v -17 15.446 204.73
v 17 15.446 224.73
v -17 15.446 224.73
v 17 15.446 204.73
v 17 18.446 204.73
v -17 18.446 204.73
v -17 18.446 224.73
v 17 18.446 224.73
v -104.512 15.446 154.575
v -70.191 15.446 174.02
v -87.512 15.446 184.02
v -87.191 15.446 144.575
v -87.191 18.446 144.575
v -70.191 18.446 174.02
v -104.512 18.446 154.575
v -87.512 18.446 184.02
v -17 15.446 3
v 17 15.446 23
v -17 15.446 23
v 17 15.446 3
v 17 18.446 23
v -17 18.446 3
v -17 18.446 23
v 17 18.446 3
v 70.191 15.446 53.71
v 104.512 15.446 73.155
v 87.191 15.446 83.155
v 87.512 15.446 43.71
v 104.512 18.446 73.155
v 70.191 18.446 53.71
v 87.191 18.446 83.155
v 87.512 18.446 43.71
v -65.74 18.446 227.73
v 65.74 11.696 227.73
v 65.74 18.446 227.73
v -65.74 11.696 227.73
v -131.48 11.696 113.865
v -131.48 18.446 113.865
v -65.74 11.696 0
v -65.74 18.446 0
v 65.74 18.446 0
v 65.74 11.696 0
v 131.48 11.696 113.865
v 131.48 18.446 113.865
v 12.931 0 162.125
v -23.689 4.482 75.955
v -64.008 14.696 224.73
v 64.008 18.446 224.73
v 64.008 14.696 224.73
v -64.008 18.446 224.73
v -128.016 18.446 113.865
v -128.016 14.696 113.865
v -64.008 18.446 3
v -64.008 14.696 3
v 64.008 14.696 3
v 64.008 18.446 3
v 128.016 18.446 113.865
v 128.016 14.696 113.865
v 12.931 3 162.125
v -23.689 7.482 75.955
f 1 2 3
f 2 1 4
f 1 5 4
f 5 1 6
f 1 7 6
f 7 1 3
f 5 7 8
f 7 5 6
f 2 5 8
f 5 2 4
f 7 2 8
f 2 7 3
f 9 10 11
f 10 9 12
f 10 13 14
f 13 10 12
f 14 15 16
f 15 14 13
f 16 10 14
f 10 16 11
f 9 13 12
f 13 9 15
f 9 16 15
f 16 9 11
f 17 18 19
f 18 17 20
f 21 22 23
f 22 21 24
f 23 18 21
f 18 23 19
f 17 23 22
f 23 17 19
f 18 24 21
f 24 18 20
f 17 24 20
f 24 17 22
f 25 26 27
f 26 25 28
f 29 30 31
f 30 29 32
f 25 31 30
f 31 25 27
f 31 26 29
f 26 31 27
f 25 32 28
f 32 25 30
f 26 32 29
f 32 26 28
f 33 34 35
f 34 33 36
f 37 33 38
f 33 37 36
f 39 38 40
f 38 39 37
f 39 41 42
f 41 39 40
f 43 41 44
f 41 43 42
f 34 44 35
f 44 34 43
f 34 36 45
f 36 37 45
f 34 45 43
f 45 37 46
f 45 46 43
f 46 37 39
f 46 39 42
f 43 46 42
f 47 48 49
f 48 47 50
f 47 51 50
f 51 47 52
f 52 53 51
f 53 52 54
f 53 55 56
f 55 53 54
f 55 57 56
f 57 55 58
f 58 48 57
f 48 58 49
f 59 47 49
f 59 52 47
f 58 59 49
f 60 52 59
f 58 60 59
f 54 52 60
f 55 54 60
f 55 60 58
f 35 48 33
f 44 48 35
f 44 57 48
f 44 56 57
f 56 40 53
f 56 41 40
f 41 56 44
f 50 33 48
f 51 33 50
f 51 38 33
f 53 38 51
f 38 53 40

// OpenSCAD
/*
    parametric_faceted_hex_wall_tile_mount_v24_10x10_vertical_flat_side.scad
    ----------------------------------------------------------------
    Regular asymmetric low-poly hex wall tile.

    v24 goals
    ---------
    1. Exact 10.00" x 10.00" finished face bounding box by default.
    2. Preserve a TRUE regular hexagon -- no X/Y stretching.
    3. Vertical-print-first export option:
       - model can export standing on one edge
       - finished wall geometry is unchanged
    4. Vertical export rests on a complete flat hex side, not a point.
    5. Open back remains fully open.
    6. Hidden mounting pads remain clipped below the visible face.
    7. One master thickness controls shell, perimeter, and pads.
    8. Optional breakaway vertical-print feet are available but OFF by default.

    Recommended default
    -------------------
    face_size_reference      = "bounding_square";
    face_size_units          = "mm";
    face_size                = 254.0;   // exact 10" x 10" envelope
    tile_rotation_deg        = 15;      // makes regular-hex X/Y envelope equal

    export_orientation       = "vertical";
    vertical_edge_angle_deg  = 15;   // flat side on build plate

    master_thickness_mm      = 3.0;
    add_mount_pads           = true;
    add_mount_ribs           = false;

    Export
    ------
    F6 Render
    File -> Export -> Export as STL
*/


// =============================================================================
// CUSTOMIZER PARAMETERS
// =============================================================================


/* [Finished Face Size] */

// "bounding_square"
//     face_size is the maximum X and Y envelope.
//     At the default 15-degree rotation, a regular hex fills the square exactly.
//
// "flat_to_flat"
//     face_size is the traditional hex flat-to-flat dimension.
//
// "across_corners"
//     face_size is the regular-hex corner-to-corner dimension.
face_size_reference = "bounding_square"; // [bounding_square, flat_to_flat, across_corners]

// Units used by face_size.
face_size_units = "mm";                   // [mm, in]

// Default = exact 10.00 inches.
face_size = 254.0;

// Rotation of the finished hex within its face plane.
//
// IMPORTANT:
// 15 degrees gives a regular hex an equal X/Y bounding envelope.
// With bounding_square + 254 mm this produces approximately:
//     X = 254.0 mm
//     Y = 254.0 mm
tile_rotation_deg = 15;


/* [Export / Print Orientation] */

// "flat"     = conventional CAD orientation; decorative face points +Z.
// "vertical" = rotate final part onto an edge for vertical printing.
export_orientation = "vertical";          // [flat, vertical]

// Additional in-plane rotation used ONLY before standing the part vertically.
//
// IMPORTANT:
// The finished face uses tile_rotation_deg = 15 so its X/Y envelope is exactly
// square. A regular hex rests on a FLAT SIDE when its effective print-plane
// rotation is 30 degrees (modulo 60 degrees).
//
// Therefore the default vertical export adds another 15 degrees:
//
//     15 deg finished-face rotation
//   + 15 deg vertical export rotation
//   = 30 deg effective print rotation
//
// This puts a complete flat hex side on the build plate instead of a point.
// The transformed model is automatically translated so that side rests at Z=0.
// Rotate the finished 15-degree face orientation another 15 degrees before
// standing it up. 15 + 15 = 30 degrees, which places a complete hex side
// horizontally at the bottom rather than balancing the tile on a vertex.
vertical_edge_angle_deg = 15;

// Add small breakaway stabilizer feet after the model is stood vertically.
// Normally leave OFF and use a slicer brim if required.
add_vertical_breakaway_feet = false;

// Breakaway-foot dimensions.
vertical_foot_length_mm = 20.0;
vertical_foot_depth_mm = 8.0;
vertical_foot_height_mm = 0.60;
vertical_foot_neck_mm = 0.80;


/* [MASTER THICKNESS] */

// Main material thickness control.
master_thickness_mm = 3.0;

// Optional tuning multipliers.
front_shell_multiplier = 1.0;
perimeter_multiplier   = 1.0;
mount_pad_multiplier   = 1.0;


/* [Front Relief] */

// "proportional" scales relief with the true flat-to-flat dimension.
// "absolute" uses explicit millimeter values.
relief_height_mode = "proportional";      // [proportional, absolute]

relief_scale = 1.0;

// Relative relief proportions.
peak_height_ratio = 0.081;
ridge_to_peak_ratio = 0.757;
edge_to_peak_ratio = 0.097;

// Used only in absolute mode.
peak_height_mm   = 18.5;
ridge_height_mm = 14.0;
edge_height_mm  = 1.8;

// Minimum air gap between inner roof and mounting geometry.
edge_clearance_mm = 0.60;


/* [Facet Layout] */

peak_angle_deg = 45;
peak_radius_ratio = 0.38;

ridge_angle_deg = 208;
ridge_radius_ratio = 0.34;


/* [Wall Mounting] */

add_mount_pads = true;

// Width parallel to local hex edge.
mount_pad_width_mm = 34.0;

// Radial depth into the cavity.
mount_pad_depth_mm = 24.0;

// Structural overlap beneath the inner perimeter shell.
mount_pad_overlap_mm = 4.0;

// Pull mounting geometry inward from the visible outside perimeter.
mount_pad_edge_inset_mm = 3.0;

// Clearance below underside of visible face.
mount_face_clearance_mm = 0.75;

// Mount-pad directions in the tile's local coordinate system.
mount_pad_angles = [60, 120, 240, 300];


/* [Mount Reinforcement] */

add_mount_ribs = false;

mount_rib_width_mm  = 3.0;
mount_rib_height_mm = 5.0;
mount_rib_depth_mm  = 8.0;


/* [Optional Screw Holes] */

add_pad_screw_holes = false;

pad_screw_hole_diameter_mm = 4.5;


/* [Advanced] */

polyhedron_convexity = 12;
screw_hole_fn = 40;

// Small numerical tolerance.
eps = 0.01;


// =============================================================================
// HELPERS
// =============================================================================

function polar(angle_deg, radius) =
    [
        radius * cos(angle_deg),
        radius * sin(angle_deg)
    ];

function hex_vertex_unrotated(i, radius) =
    [
        radius * cos(30 + i * 60),
        radius * sin(30 + i * 60)
    ];

function rotate2d(p, angle_deg) =
    [
        p[0] * cos(angle_deg) - p[1] * sin(angle_deg),
        p[0] * sin(angle_deg) + p[1] * cos(angle_deg)
    ];

function hex_vertex(i, radius) =
    rotate2d(
        hex_vertex_unrotated(i, radius),
        tile_rotation_deg
    );

// Half-width / half-height of a unit-circumradius rotated regular hex.
function unit_hex_half_x(rotation_deg) =
    max([
        for (i = [0 : 5])
            abs(
                cos(30 + i * 60 + rotation_deg)
            )
    ]);

function unit_hex_half_y(rotation_deg) =
    max([
        for (i = [0 : 5])
            abs(
                sin(30 + i * 60 + rotation_deg)
            )
    ]);

// Bounding box of a regular hex with circumradius r.
function hex_bbox_x(r, rotation_deg) =
    2 * r * unit_hex_half_x(rotation_deg);

function hex_bbox_y(r, rotation_deg) =
    2 * r * unit_hex_half_y(rotation_deg);


// =============================================================================
// DERIVED MATERIAL THICKNESSES
// =============================================================================

front_shell_thickness_mm =
    master_thickness_mm * front_shell_multiplier;

perimeter_wall_thickness_mm =
    master_thickness_mm * perimeter_multiplier;

mount_pad_thickness_mm =
    master_thickness_mm * mount_pad_multiplier;


// =============================================================================
// DERIVED FACE DIMENSIONS
// =============================================================================

_face_size_mm =
    face_size_units == "in"
        ? face_size * 25.4
        : face_size;

// If bounding_square is selected, choose the largest regular-hex radius that
// fits inside both the requested X and Y dimensions.
//
// At tile_rotation_deg = 15, unit X and Y extents are equal, so both dimensions
// become exactly face_size.
r_outer =
    face_size_reference == "flat_to_flat"
        ? (_face_size_mm / 2) / cos(30)
        : face_size_reference == "across_corners"
            ? _face_size_mm / 2
            : min(
                _face_size_mm / (2 * unit_hex_half_x(tile_rotation_deg)),
                _face_size_mm / (2 * unit_hex_half_y(tile_rotation_deg))
              );

tile_flat_to_flat =
    2 * r_outer * cos(30);

tile_across_corners =
    2 * r_outer;

finished_bbox_x =
    hex_bbox_x(r_outer, tile_rotation_deg);

finished_bbox_y =
    hex_bbox_y(r_outer, tile_rotation_deg);

outer_apothem =
    tile_flat_to_flat / 2;

inner_apothem =
    outer_apothem - perimeter_wall_thickness_mm;

r_inner =
    inner_apothem / cos(30);

inner_flat_length =
    2 * inner_apothem * tan(30);

hex_side_length =
    r_outer;


// =============================================================================
// DERIVED RELIEF HEIGHTS
// =============================================================================

_peak_unscaled =
    relief_height_mode == "proportional"
        ? tile_flat_to_flat * peak_height_ratio
        : peak_height_mm;

_ridge_unscaled =
    relief_height_mode == "proportional"
        ? _peak_unscaled * ridge_to_peak_ratio
        : ridge_height_mm;

_requested_edge_unscaled =
    relief_height_mode == "proportional"
        ? _peak_unscaled * edge_to_peak_ratio
        : edge_height_mm;

peak_height =
    _peak_unscaled * relief_scale;

ridge_height =
    _ridge_unscaled * relief_scale;

requested_edge_height =
    _requested_edge_unscaled * relief_scale;

// Enough vertical room for front shell + complete pad + clearance.
minimum_edge_height =
    front_shell_thickness_mm
    + mount_pad_thickness_mm
    + mount_face_clearance_mm;

edge_height =
    max(
        requested_edge_height,
        minimum_edge_height
    );


// =============================================================================
// DERIVED MOUNTING GEOMETRY
// =============================================================================

mount_pad_desired_outer_r =
    inner_apothem + mount_pad_overlap_mm;

mount_pad_inner_r =
    mount_pad_desired_outer_r - mount_pad_depth_mm;

mount_pad_center_r =
    mount_pad_desired_outer_r - mount_pad_depth_mm / 2;

mount_clip_apothem =
    outer_apothem - mount_pad_edge_inset_mm;

mount_clip_radius =
    mount_clip_apothem / cos(30);


// =============================================================================
// VERTICAL-EXPORT DERIVED VALUES
// =============================================================================
//
// The tile is first rotated around Z by vertical_edge_angle_deg, then stood up
// by +90 degrees around X.
//
// We calculate the local Y envelope AFTER that optional Z rotation so the
// final model can be translated to put its lowest point exactly on Z=0.

vertical_rotation_total_deg =
    vertical_edge_angle_deg;

vertical_half_y =
    max([
        for (i = [0 : 5])
            abs(
                r_outer
                * sin(
                    30
                    + i * 60
                    + tile_rotation_deg
                    + vertical_rotation_total_deg
                )
            )
    ]);

vertical_print_height =
    2 * vertical_half_y;

// After rotate([90,0,0]), original +Z becomes -Y.
// Translate by peak_height so all relief lies in positive Y.
vertical_print_depth =
    peak_height;


// =============================================================================
// VALIDATION
// =============================================================================

assert(
    _face_size_mm > 0,
    "face_size must produce a positive dimension."
);

assert(
    master_thickness_mm > 0,
    "master_thickness_mm must be greater than zero."
);

assert(
    front_shell_multiplier > 0
    && perimeter_multiplier > 0
    && mount_pad_multiplier > 0,
    "All thickness multipliers must be greater than zero."
);

assert(
    front_shell_thickness_mm > 0,
    "front_shell_thickness_mm must be greater than zero."
);

assert(
    perimeter_wall_thickness_mm > 0,
    "perimeter_wall_thickness_mm must be greater than zero."
);

assert(
    perimeter_wall_thickness_mm < outer_apothem,
    "perimeter_wall_thickness_mm is too large for this tile."
);

assert(
    inner_apothem > 0,
    "The selected perimeter wall leaves no hollow interior."
);

assert(
    edge_height > front_shell_thickness_mm,
    "Internal error: edge_height must exceed front_shell_thickness_mm."
);

assert(
    ridge_height > edge_height,
    "ridge_height must remain greater than the effective edge height."
);

assert(
    peak_height > ridge_height,
    "peak_height must remain greater than ridge_height."
);

assert(
    peak_radius_ratio > 0 && peak_radius_ratio < 0.90,
    "peak_radius_ratio must be between 0 and 0.90."
);

assert(
    ridge_radius_ratio > 0 && ridge_radius_ratio < 0.90,
    "ridge_radius_ratio must be between 0 and 0.90."
);

assert(
    mount_pad_width_mm > 0,
    "mount_pad_width_mm must be greater than zero."
);

assert(
    mount_pad_depth_mm > 0,
    "mount_pad_depth_mm must be greater than zero."
);

assert(
    mount_pad_thickness_mm > 0,
    "mount_pad_thickness_mm must be greater than zero."
);

assert(
    mount_pad_overlap_mm >= 0,
    "mount_pad_overlap_mm cannot be negative."
);

assert(
    mount_pad_edge_inset_mm >= 0,
    "mount_pad_edge_inset_mm cannot be negative."
);

assert(
    mount_face_clearance_mm >= 0,
    "mount_face_clearance_mm cannot be negative."
);

assert(
    mount_clip_apothem > 0,
    "mount_pad_edge_inset_mm is too large."
);

assert(
    mount_pad_inner_r > 0,
    "mount_pad_depth_mm is too large and reaches/passes the tile center."
);

assert(
    !add_pad_screw_holes
    || pad_screw_hole_diameter_mm < mount_pad_width_mm * 0.75,
    "pad_screw_hole_diameter_mm is too large for the mounting pad."
);

assert(
    !add_mount_ribs
    || mount_rib_height_mm > 0,
    "mount_rib_height_mm must be greater than zero."
);

assert(
    !add_vertical_breakaway_feet
    || export_orientation == "vertical",
    "Vertical breakaway feet require export_orientation = \"vertical\"."
);


// =============================================================================
// DIAGNOSTIC OUTPUT
// =============================================================================

echo("====================================================");
echo("FACETED HEX WALL TILE v24 - 10x10 / VERTICAL FLAT-SIDE");
echo("====================================================");

echo(str("face size reference      : ", face_size_reference));
echo(str("requested face size      : ", _face_size_mm, " mm"));
echo(str("tile rotation            : ", tile_rotation_deg, " deg"));

echo(str("finished bbox X          : ", finished_bbox_x, " mm"));
echo(str("finished bbox Y          : ", finished_bbox_y, " mm"));
echo(str("finished bbox X inches   : ", finished_bbox_x / 25.4, " in"));
echo(str("finished bbox Y inches   : ", finished_bbox_y / 25.4, " in"));

echo(str("flat-to-flat             : ", tile_flat_to_flat, " mm"));
echo(str("across-corners           : ", tile_across_corners, " mm"));
echo(str("hex side length          : ", hex_side_length, " mm"));

echo(str("MASTER thickness         : ", master_thickness_mm, " mm"));
echo(str("actual front shell       : ", front_shell_thickness_mm, " mm"));
echo(str("actual perimeter wall    : ", perimeter_wall_thickness_mm, " mm"));
echo(str("actual mount pad         : ", mount_pad_thickness_mm, " mm"));

echo(str("requested edge height    : ", requested_edge_height, " mm"));
echo(str("minimum edge height      : ", minimum_edge_height, " mm"));
echo(str("EFFECTIVE edge height    : ", edge_height, " mm"));

echo(str("ridge height             : ", ridge_height, " mm"));
echo(str("peak height              : ", peak_height, " mm"));
echo(str("peak height inches       : ", peak_height / 25.4, " in"));

echo(str("mount pad width          : ", mount_pad_width_mm, " mm"));
echo(str("mount pad depth          : ", mount_pad_depth_mm, " mm"));
echo(str("mount pad thickness      : ", mount_pad_thickness_mm, " mm"));
echo(str("mount pad overlap        : ", mount_pad_overlap_mm, " mm"));
echo(str("mount edge inset         : ", mount_pad_edge_inset_mm, " mm"));
echo(str("mount/face clearance     : ", mount_face_clearance_mm, " mm"));

echo(str("export orientation       : ", export_orientation));
echo(str("vertical extra rotation  : ", vertical_edge_angle_deg, " deg"));
echo(str("effective print rotation : ",
         tile_rotation_deg + vertical_edge_angle_deg, " deg"));

if (export_orientation == "vertical"
    && abs(
        ((tile_rotation_deg + vertical_edge_angle_deg) % 60) - 30
    ) < 0.001)
    echo("build-plate contact      : FLAT HEX SIDE");
else if (export_orientation == "vertical")
    echo("build-plate contact      : WARNING - NOT EXACTLY FLAT-SIDE DOWN");

if (export_orientation == "vertical") {
    echo(str("vertical print height    : ", vertical_print_height, " mm"));
    echo(str("vertical print depth     : ", vertical_print_depth, " mm"));
}

if (edge_height > requested_edge_height)
    echo(
        str(
            "AUTO EDGE FIX ACTIVE: edge raised from ",
            requested_edge_height,
            " mm to ",
            edge_height,
            " mm."
        )
    );

echo("====================================================");


// =============================================================================
// FRONT RELIEF CONTROL POINTS
// =============================================================================

P_xy =
    polar(
        peak_angle_deg + tile_rotation_deg,
        r_outer * peak_radius_ratio
    );

Q_xy =
    polar(
        ridge_angle_deg + tile_rotation_deg,
        r_outer * ridge_radius_ratio
    );


// =============================================================================
// SHELL VERTICES
// =============================================================================

points =
    concat(

        // 0..5 : outer rear perimeter
        [
            for (i = [0 : 5])
                let(p = hex_vertex(i, r_outer))
                [p[0], p[1], 0]
        ],

        // 6..11 : outer front perimeter
        [
            for (i = [0 : 5])
                let(p = hex_vertex(i, r_outer))
                [p[0], p[1], edge_height]
        ],

        // 12..13 : outer peak / ridge
        [
            [P_xy[0], P_xy[1], peak_height],
            [Q_xy[0], Q_xy[1], ridge_height]
        ],

        // 14..19 : inner rear perimeter
        [
            for (i = [0 : 5])
                let(p = hex_vertex(i, r_inner))
                [p[0], p[1], 0]
        ],

        // 20..25 : inner front perimeter
        [
            for (i = [0 : 5])
                let(p = hex_vertex(i, r_inner))
                [p[0], p[1], edge_height - front_shell_thickness_mm]
        ],

        // 26..27 : inner peak / ridge
        [
            [
                P_xy[0],
                P_xy[1],
                peak_height - front_shell_thickness_mm
            ],
            [
                Q_xy[0],
                Q_xy[1],
                ridge_height - front_shell_thickness_mm
            ]
        ]
    );


// =============================================================================
// SHELL FACES
// =============================================================================

outer_roof_faces = [
    [6, 7, 12],
    [7, 8, 12],
    [6, 12, 11],

    [8, 13, 12],
    [11, 12, 13],

    [8, 9, 13],
    [9, 10, 13],
    [10, 11, 13]
];

inner_roof_faces = [
    [26, 21, 20],
    [26, 22, 21],
    [25, 26, 20],

    [26, 27, 22],
    [27, 26, 25],

    [27, 23, 22],
    [27, 24, 23],
    [27, 25, 24]
];

faces =
    concat(

        // Outer vertical perimeter
        [
            for (i = [0 : 5])
                [
                    i,
                    (i + 1) % 6,
                    6 + (i + 1) % 6,
                    6 + i
                ]
        ],

        outer_roof_faces,

        // Inner vertical perimeter
        [
            for (i = [0 : 5])
                [
                    14 + i,
                    20 + i,
                    20 + (i + 1) % 6,
                    14 + (i + 1) % 6
                ]
        ],

        inner_roof_faces,

        // Narrow rear perimeter ring only.
        // Center remains fully open.
        [
            for (i = [0 : 5])
                [
                    i,
                    14 + i,
                    14 + (i + 1) % 6,
                    (i + 1) % 6
                ]
        ]
    );


// =============================================================================
// TILE SHELL
// =============================================================================

module tile_shell() {
    polyhedron(
        points = points,
        faces = faces,
        convexity = polyhedron_convexity
    );
}


// =============================================================================
// SAFE MOUNTING VOLUME BELOW FRONT FACE
// =============================================================================

safe_edge_z =
    max(
        eps,
        edge_height
        - front_shell_thickness_mm
        - mount_face_clearance_mm
    );

safe_peak_z =
    max(
        eps,
        peak_height
        - front_shell_thickness_mm
        - mount_face_clearance_mm
    );

safe_ridge_z =
    max(
        eps,
        ridge_height
        - front_shell_thickness_mm
        - mount_face_clearance_mm
    );

safe_mount_points =
    concat(

        // 0..5 : rear outer perimeter
        [
            for (i = [0 : 5])
                let(p = hex_vertex(i, r_outer))
                [p[0], p[1], 0]
        ],

        // 6..11 : safe ceiling at outer perimeter
        [
            for (i = [0 : 5])
                let(p = hex_vertex(i, r_outer))
                [p[0], p[1], safe_edge_z]
        ],

        // 12..13 : safe ceiling under peak/ridge
        [
            [P_xy[0], P_xy[1], safe_peak_z],
            [Q_xy[0], Q_xy[1], safe_ridge_z]
        ]
    );

safe_mount_ceiling_faces = [
    [6, 7, 12],
    [7, 8, 12],
    [6, 12, 11],
    [8, 13, 12],
    [11, 12, 13],
    [8, 9, 13],
    [9, 10, 13],
    [10, 11, 13]
];

safe_mount_faces =
    concat(

        // Outer side walls.
        [
            for (i = [0 : 5])
                [
                    i,
                    (i + 1) % 6,
                    6 + (i + 1) % 6,
                    6 + i
                ]
        ],

        // Sloped safe ceiling.
        safe_mount_ceiling_faces,

        // Rear floor used only to close clipping volume.
        [[5, 4, 3, 2, 1, 0]]
    );

module safe_mount_volume() {
    polyhedron(
        points = safe_mount_points,
        faces = safe_mount_faces,
        convexity = polyhedron_convexity
    );
}


// =============================================================================
// HEX FOOTPRINT FOR MOUNT CLIPPING
// =============================================================================

module mount_clip_volume(height_mm) {
    linear_extrude(height = height_mm)
        polygon(
            points = [
                for (i = [0 : 5])
                    hex_vertex(i, mount_clip_radius)
            ]
        );
}


// =============================================================================
// RAW MOUNT PAD
// =============================================================================
//
// Mount-pad angles are local tile angles. tile_rotation_deg is applied so the
// pads remain attached to the same visual positions when the face rotates.

module raw_mount_pad(angle_deg) {
    rotate([0, 0, angle_deg + tile_rotation_deg])
        translate(
            [
                mount_pad_inner_r,
                -mount_pad_width_mm / 2,
                0
            ]
        )
            cube(
                [
                    mount_pad_depth_mm,
                    mount_pad_width_mm,
                    mount_pad_thickness_mm
                ]
            );
}


// =============================================================================
// CLIPPED MOUNT PAD
// =============================================================================

module mount_pad(angle_deg) {
    intersection() {

        raw_mount_pad(angle_deg);

        // Keep pad inside inset hex footprint.
        mount_clip_volume(
            mount_pad_thickness_mm + eps
        );

        // Hard stop below underside of front shell.
        safe_mount_volume();
    }
}


// =============================================================================
// OPTIONAL REINFORCING RIBS
// =============================================================================

module raw_mount_ribs(angle_deg) {

    rib_center_r =
        mount_pad_desired_outer_r
        - mount_rib_depth_mm / 2;

    rib_side_offset =
        max(
            0,
            mount_pad_width_mm / 2
            - mount_rib_width_mm
            - 2
        );

    rotate([0, 0, angle_deg + tile_rotation_deg]) {

        for (side = [-1, 1]) {

            translate(
                [
                    rib_center_r - mount_rib_depth_mm / 2,
                    side * rib_side_offset - mount_rib_width_mm / 2,
                    mount_pad_thickness_mm
                ]
            )

            rotate([90, 0, 90])

            linear_extrude(height = mount_rib_depth_mm)

            polygon(
                points = [
                    [0, 0],
                    [mount_rib_width_mm, 0],
                    [mount_rib_width_mm, mount_rib_height_mm],
                    [0, 0]
                ]
            );
        }
    }
}

module mount_ribs(angle_deg) {
    intersection() {

        raw_mount_ribs(angle_deg);

        mount_clip_volume(
            mount_pad_thickness_mm
            + mount_rib_height_mm
            + 0.1
        );

        safe_mount_volume();
    }
}


// =============================================================================
// OPTIONAL SCREW HOLE
// =============================================================================

module pad_screw_hole(angle_deg) {

    rotate([0, 0, angle_deg + tile_rotation_deg])

        translate(
            [
                mount_pad_center_r,
                0,
                -1
            ]
        )

            cylinder(
                d = pad_screw_hole_diameter_mm,
                h =
                    mount_pad_thickness_mm
                    + mount_rib_height_mm
                    + 2,
                $fn = screw_hole_fn
            );
}


// =============================================================================
// COMPLETE FINISHED TILE
// =============================================================================

module finished_tile() {

    difference() {

        union() {

            tile_shell();

            if (add_mount_pads) {

                for (a = mount_pad_angles) {

                    mount_pad(a);

                    if (add_mount_ribs)
                        mount_ribs(a);
                }
            }
        }

        if (
            add_mount_pads
            && add_pad_screw_holes
        ) {

            for (a = mount_pad_angles)
                pad_screw_hole(a);
        }
    }
}


// =============================================================================
// VERTICAL-PRINT TRANSFORM
// =============================================================================
//
// Transform order in OpenSCAD is inside-out:
//
// 1. finished_tile()
// 2. optional extra Z rotation for selecting another edge
// 3. rotate +90 degrees around X so the face stands vertically
// 4. translate so:
//      - relief depth occupies positive Y
//      - lowest tile point is exactly at Z=0

module vertical_tile() {

    translate(
        [
            0,
            peak_height,
            vertical_half_y
        ]
    )

    rotate([90, 0, 0])

    rotate([0, 0, vertical_edge_angle_deg])

        finished_tile();
}


// =============================================================================
// OPTIONAL BREAKAWAY VERTICAL FEET
// =============================================================================
//
// These are intentionally simple sacrificial tabs.
// They are added only in vertical export mode.
// Leave OFF unless a brim alone is not sufficient.

module vertical_breakaway_feet() {

    // Two feet spread across X.
    foot_x =
        finished_bbox_x * 0.28;

    for (x = [-foot_x, foot_x]) {

        // Main foot.
        translate(
            [
                x - vertical_foot_length_mm / 2,
                0,
                0
            ]
        )
            cube(
                [
                    vertical_foot_length_mm,
                    vertical_foot_depth_mm,
                    vertical_foot_height_mm
                ]
            );

        // Narrow neck connecting foot to the tile plane.
        translate(
            [
                x - vertical_foot_neck_mm / 2,
                vertical_foot_depth_mm - vertical_foot_neck_mm,
                0
            ]
        )
            cube(
                [
                    vertical_foot_neck_mm,
                    vertical_foot_neck_mm,
                    min(edge_height, 3.0)
                ]
            );
    }
}


// =============================================================================
// OUTPUT
// =============================================================================

module output_model() {

    if (export_orientation == "vertical") {

        union() {

            vertical_tile();

            if (add_vertical_breakaway_feet)
                vertical_breakaway_feet();
        }

    } else {

        finished_tile();
    }
}

output_model();
